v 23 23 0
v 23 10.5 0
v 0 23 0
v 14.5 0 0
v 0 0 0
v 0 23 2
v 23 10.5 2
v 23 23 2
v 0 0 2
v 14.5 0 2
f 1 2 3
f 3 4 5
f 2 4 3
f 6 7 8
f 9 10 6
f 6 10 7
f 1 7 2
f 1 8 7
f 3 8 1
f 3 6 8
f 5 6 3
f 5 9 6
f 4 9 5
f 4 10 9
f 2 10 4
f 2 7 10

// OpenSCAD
rear_width = 23;
large_side_depth = 23;
narrow_side_depth = 14.5;
front_width = 10.5;

// heigh of feet 2 for test, 20 for 3/4 in. [2, 20]
height = 2;

linear_extrude(height = height) {
    polygon(points = [[0, 0], [0, rear_width], [large_side_depth, rear_width], [large_side_depth, 0], [large_side_depth, front_width], [narrow_side_depth, 0]]);
}
